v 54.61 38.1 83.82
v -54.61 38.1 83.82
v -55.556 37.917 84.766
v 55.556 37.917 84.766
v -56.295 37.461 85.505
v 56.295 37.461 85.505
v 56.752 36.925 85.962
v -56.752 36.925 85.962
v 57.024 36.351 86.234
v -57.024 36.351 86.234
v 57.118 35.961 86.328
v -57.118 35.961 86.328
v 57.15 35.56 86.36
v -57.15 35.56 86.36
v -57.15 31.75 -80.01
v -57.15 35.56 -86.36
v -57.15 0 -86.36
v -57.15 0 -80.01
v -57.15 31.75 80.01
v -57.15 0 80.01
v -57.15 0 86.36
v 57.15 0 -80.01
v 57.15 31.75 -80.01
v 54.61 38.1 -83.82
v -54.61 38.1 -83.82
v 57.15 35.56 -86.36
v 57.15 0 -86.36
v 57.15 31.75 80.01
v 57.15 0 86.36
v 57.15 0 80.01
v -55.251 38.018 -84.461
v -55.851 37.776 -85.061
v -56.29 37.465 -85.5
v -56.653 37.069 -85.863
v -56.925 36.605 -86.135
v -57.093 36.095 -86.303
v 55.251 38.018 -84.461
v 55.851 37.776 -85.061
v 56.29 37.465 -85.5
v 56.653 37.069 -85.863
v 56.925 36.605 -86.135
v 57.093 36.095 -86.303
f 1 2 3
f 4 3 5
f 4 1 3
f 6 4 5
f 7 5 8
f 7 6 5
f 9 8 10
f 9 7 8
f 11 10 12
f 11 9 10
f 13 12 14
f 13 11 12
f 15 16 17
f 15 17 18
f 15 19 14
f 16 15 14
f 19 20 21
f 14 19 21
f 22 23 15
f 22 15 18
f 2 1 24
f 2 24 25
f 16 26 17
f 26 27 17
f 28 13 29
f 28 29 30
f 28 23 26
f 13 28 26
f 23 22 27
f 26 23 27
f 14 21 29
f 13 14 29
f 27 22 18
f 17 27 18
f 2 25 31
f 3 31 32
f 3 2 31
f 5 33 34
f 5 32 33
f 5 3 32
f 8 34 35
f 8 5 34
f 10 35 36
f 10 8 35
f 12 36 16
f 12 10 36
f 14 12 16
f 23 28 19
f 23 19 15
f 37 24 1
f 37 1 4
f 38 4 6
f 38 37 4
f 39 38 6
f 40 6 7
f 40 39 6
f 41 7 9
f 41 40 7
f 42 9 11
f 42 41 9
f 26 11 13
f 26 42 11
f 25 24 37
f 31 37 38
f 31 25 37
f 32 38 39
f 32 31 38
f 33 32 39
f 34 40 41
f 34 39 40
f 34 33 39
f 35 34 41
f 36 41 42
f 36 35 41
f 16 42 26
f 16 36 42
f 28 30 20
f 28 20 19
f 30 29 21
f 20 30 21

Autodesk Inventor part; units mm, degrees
ref_plane "YZ Plane" through (0, 0, 0) normal (1, 0, 0) x (0, 1, 0)
ref_plane "XZ Plane" through (0, 0, 0) normal (0, 1, 0) x (-1, 0, 0)
ref_plane "XY Plane" through (0, 0, 0) normal (0, 0, 1) x (1, 0, 0)
sketch "Sketch1" plane through (0, 0, 0) normal (0, 1, 0) x (-1, 0, 0)
  line L0 (-57.15, -86.36) -> (57.15, -86.36)
  line L1 (57.15, -86.36) -> (57.15, 86.36)
  line L2 (57.15, 86.36) -> (-57.15, 86.36)
  line L3 (-57.15, 86.36) -> (-57.15, -86.36)
  line L4 (-57.15, -86.36) -> (57.15, 86.36) construction
  line L5 (57.15, -86.36) -> (-57.15, 86.36) construction
  point P0 (0, 0)
  dimension "d0" = 114.3
  dimension "d1" = 172.72
extrude "Extrusion1" add sketch "Sketch1" along normal blind 38.1
sketch "Sketch2" plane through (57.15, 0, 86.36) normal (1, 0, 0) x (0, 0, -1)
  line L0 (6.35, 31.75) -> (166.37, 31.75)
  line L1 (166.37, 31.75) -> (166.37, 0)
  line L2 (166.37, 0) -> (6.35, 0)
  line L3 (6.35, 0) -> (6.35, 31.75)
  line L4 (0, 0) -> (172.72, 0) projected
  line L5 (172.72, 0) -> (172.72, 38.1) projected
  point P0 (86.36, 0)
  dimension "d4" = 160.02
  dimension "d5" = 31.75
  dimension "d6" = 0
  dimension "d7" = 6.35
extrude "Extrusion2" cut sketch "Sketch2" against normal blind 127
fillet "Fillet1" radius 2.54 4 edges at (0, 38.1, 86.36) (0, 38.1, -86.36) (57.15, 38.1, 0) (-57.15, 38.1, 0)
sketch "Sketch3" plane through (-57.15, 0, 86.36) normal (0, 0, 1) x (1, 0, 0)
  point P0 (57.15, 0)
properties part number "NavX_Box"
